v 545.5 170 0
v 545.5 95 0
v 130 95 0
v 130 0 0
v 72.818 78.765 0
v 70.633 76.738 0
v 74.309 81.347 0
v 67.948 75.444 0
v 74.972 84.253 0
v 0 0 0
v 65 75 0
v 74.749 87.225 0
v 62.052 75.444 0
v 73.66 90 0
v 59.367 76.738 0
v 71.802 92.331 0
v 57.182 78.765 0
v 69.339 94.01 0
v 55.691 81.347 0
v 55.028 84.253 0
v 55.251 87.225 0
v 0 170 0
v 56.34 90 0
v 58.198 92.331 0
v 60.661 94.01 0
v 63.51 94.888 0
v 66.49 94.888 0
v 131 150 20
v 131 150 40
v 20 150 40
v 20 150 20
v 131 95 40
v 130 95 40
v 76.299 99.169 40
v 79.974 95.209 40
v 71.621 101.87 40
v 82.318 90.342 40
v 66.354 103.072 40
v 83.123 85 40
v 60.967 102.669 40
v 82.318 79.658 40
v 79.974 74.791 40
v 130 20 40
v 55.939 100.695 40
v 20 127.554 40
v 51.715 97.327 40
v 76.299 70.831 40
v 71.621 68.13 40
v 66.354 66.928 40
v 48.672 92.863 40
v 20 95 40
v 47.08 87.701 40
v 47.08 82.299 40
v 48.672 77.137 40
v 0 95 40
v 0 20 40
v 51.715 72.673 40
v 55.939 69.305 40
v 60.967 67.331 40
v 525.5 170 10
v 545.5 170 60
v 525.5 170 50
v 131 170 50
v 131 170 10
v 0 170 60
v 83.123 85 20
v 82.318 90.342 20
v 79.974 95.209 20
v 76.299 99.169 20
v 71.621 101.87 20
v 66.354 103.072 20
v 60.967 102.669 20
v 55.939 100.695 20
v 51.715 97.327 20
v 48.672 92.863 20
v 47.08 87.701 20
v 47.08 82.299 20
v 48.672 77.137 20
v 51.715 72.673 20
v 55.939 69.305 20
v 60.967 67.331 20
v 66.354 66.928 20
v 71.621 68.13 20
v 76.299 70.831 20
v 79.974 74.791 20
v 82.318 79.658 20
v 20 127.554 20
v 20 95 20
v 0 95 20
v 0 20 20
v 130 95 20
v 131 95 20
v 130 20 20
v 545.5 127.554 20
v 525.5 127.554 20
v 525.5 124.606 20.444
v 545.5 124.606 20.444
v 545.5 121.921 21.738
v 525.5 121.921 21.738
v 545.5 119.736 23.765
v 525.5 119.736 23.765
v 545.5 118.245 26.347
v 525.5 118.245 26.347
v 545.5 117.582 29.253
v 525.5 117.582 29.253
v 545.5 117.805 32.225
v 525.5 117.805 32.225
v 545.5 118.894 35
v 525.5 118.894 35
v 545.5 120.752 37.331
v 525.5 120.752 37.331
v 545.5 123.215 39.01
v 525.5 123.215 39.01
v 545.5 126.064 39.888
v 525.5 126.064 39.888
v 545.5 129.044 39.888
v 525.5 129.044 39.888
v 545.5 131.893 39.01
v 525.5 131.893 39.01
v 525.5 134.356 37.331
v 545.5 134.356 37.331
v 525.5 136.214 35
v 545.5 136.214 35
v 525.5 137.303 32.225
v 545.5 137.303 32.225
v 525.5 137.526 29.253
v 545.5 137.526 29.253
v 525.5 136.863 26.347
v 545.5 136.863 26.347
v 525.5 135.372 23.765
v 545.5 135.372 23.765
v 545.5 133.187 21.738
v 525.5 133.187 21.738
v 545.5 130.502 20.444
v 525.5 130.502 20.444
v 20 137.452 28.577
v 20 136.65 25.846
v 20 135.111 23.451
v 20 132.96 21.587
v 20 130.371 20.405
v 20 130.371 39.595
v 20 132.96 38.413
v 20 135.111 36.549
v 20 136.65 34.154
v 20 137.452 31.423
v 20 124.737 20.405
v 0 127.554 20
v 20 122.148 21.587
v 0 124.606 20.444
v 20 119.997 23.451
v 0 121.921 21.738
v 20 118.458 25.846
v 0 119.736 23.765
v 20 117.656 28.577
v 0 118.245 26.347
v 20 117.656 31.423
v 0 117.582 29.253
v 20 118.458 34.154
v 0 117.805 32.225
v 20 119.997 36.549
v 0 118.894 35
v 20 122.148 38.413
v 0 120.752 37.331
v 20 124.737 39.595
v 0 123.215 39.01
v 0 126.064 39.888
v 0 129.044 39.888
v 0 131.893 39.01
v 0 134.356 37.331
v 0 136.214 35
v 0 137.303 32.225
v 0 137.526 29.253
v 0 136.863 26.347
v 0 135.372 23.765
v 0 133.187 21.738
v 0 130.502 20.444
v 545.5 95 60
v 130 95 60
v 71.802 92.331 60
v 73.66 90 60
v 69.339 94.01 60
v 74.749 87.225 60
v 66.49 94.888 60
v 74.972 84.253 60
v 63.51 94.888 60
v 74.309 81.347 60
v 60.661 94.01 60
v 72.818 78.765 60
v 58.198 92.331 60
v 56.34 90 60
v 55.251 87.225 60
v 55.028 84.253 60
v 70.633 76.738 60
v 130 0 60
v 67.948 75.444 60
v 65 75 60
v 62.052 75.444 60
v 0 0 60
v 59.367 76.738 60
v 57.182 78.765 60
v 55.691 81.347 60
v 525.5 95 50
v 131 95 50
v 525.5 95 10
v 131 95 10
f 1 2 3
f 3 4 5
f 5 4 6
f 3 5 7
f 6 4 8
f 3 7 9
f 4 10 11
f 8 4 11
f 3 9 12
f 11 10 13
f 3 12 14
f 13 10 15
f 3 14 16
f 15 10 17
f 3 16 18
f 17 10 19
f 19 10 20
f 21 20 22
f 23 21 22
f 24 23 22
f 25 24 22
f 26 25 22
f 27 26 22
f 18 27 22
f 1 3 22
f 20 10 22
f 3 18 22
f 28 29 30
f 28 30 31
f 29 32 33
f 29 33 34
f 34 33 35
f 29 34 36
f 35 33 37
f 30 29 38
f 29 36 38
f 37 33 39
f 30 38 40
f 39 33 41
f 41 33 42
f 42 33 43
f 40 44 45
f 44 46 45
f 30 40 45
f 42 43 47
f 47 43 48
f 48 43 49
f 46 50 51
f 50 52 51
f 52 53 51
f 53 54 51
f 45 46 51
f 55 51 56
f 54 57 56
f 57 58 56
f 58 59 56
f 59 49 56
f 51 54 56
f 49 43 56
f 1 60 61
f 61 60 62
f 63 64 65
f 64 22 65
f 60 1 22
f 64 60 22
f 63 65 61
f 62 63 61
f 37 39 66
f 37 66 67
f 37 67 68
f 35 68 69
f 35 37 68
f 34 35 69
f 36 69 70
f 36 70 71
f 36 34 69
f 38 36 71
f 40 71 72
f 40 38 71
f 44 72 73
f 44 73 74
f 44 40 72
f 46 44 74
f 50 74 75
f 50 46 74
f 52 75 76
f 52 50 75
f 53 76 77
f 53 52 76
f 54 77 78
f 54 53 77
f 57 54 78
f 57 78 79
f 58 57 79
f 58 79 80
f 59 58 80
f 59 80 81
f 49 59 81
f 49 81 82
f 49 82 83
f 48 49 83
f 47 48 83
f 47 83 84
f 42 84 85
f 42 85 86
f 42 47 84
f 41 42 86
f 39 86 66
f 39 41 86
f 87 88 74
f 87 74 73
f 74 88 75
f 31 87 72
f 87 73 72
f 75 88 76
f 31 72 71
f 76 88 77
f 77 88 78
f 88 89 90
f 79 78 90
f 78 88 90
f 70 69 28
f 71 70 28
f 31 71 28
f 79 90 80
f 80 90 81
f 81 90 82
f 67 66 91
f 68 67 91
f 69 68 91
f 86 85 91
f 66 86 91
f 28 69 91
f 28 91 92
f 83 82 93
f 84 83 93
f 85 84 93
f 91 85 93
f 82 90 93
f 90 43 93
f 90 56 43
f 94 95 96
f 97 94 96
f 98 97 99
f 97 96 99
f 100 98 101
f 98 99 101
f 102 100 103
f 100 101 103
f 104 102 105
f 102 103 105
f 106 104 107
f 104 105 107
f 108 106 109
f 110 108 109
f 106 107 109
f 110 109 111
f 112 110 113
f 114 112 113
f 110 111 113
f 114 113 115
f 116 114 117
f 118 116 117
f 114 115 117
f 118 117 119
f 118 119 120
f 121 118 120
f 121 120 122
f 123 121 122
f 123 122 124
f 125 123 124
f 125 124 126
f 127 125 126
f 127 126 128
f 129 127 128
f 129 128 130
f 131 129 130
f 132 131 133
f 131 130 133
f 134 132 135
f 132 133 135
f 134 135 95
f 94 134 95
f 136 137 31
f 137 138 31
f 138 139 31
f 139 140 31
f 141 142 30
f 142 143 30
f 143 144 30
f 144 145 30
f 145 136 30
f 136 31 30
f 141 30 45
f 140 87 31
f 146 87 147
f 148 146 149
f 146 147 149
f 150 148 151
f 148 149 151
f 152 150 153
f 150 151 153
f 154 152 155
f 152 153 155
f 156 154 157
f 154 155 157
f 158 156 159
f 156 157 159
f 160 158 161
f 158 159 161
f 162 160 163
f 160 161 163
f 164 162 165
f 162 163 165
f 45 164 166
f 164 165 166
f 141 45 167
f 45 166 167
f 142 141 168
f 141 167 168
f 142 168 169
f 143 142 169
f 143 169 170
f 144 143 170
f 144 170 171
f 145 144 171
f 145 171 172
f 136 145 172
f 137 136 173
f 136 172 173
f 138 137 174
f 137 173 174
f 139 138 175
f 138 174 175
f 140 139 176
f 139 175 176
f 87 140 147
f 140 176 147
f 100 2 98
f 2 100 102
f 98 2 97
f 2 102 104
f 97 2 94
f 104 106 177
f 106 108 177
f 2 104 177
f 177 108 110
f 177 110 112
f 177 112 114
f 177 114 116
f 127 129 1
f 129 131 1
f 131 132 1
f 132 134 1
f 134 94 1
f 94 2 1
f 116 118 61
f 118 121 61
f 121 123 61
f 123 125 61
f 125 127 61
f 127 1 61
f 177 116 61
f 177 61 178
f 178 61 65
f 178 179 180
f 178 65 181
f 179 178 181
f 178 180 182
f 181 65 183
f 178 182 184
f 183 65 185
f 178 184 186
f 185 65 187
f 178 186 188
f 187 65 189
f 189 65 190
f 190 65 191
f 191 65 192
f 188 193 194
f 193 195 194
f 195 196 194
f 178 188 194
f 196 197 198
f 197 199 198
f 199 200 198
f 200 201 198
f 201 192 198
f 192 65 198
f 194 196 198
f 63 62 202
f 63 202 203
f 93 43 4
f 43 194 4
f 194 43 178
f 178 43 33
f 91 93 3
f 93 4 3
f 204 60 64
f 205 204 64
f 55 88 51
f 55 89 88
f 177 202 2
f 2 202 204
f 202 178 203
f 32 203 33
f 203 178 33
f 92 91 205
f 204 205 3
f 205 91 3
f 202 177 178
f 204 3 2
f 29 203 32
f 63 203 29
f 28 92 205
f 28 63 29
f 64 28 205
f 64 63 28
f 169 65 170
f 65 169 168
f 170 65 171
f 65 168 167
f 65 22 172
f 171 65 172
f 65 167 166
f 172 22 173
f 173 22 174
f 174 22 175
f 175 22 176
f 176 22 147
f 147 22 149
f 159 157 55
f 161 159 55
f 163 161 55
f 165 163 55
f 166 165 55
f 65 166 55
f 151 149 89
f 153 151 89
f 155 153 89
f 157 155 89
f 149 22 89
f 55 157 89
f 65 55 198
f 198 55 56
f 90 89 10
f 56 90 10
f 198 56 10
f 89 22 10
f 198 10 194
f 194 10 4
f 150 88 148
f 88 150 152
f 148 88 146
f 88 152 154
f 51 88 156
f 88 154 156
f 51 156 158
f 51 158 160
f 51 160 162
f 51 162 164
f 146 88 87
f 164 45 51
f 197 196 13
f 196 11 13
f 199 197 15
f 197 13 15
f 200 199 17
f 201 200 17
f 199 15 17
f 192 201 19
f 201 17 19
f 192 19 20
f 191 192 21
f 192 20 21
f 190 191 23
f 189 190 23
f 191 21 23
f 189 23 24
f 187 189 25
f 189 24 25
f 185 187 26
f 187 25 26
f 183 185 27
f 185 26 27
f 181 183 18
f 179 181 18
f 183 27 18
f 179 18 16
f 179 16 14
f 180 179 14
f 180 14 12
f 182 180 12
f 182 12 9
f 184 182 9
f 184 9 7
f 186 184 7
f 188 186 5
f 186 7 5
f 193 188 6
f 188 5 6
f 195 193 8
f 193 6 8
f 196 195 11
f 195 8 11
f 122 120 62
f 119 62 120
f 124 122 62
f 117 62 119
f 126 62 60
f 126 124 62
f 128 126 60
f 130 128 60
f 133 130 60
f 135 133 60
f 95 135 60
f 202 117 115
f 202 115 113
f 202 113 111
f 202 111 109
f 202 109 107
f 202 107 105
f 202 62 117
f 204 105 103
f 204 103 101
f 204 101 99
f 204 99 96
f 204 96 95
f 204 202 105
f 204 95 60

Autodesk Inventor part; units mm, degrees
ref_plane "YZ Plane" through (0, 0, 0) normal (1, 0, 0) x (0, 1, 0)
ref_plane "XZ Plane" through (0, 0, 0) normal (0, 1, 0) x (-1, 0, 0)
sketch "Boceto1" plane through (0, 0, 0) normal (0, 0, 1) x (1, 0, 0)
  line L0 (0, 0) -> (130, 0)
  line L1 (130, 0) -> (130, 95)
  line L2 (130, 95) -> (545, 95)
  line L3 (545, 95) -> (545, 170)
  line L4 (545, 170) -> (0, 170)
  line L5 (0, 170) -> (0, 0)
  circle A0 centre (65, 85) radius 10
  dimension "d1" = 95
  dimension "d3" = 75
  dimension "d19" = 20
extrude "Extrusión1" add sketch "Boceto1" along normal blind 60 contours L5 L4 L3 L2 L1 L0 | A0
ref_plane "Plano de trabajo1" through (65, 0, 0) normal (1, 0, 0) x (0, 0, -1)
sketch "Boceto2" plane through (65, 0, 0) normal (1, 0, 0) x (0, 0, -1)
  line L0 (-20, 75) -> (-40, 75)
  line L1 (-40, 75) -> (-40, 20)
  line L2 (0, 0) -> (-60, 0) projected
  line L3 (-40, 20) -> (-20, 20)
  line L4 (-20, 75) -> (-20, 20)
  dimension "d8" = 20
  dimension "d9" = 55
  dimension "d10" = 20
extrude "Extrusión2" cut sketch "Boceto2" along normal blind 400 and the other way blind 200
sketch "Boceto3" plane through (130, 0, 0) normal (1, 0, 0) x (0, 0, -1)
  line L0 (-20, 75) -> (-40, 75) projected
  line L1 (-40, 75) -> (-40, 150)
  line L2 (0, 170) -> (-60, 170) projected
  line L3 (-40, 150) -> (-20, 150)
  line L4 (-20, 150) -> (-20, 75)
  point P0 (0, 0)
  dimension "d15" = 75
  dimension "d16" = 20
extrude "Extrusión3" cut sketch "Boceto3" along normal mid plane 7000
sketch "Boceto4" plane through (65, 0, 0) normal (1, 0, 0) x (0, 0, -1)
  point P0 (0, 0)
sketch "Boceto5" plane through (0, 0, 60) normal (0, 0, 1) x (1, 0, 0)
  line L0 (130, 95) -> (545, 95) projected
  line L1 (545, 170) -> (0, 170) projected
  line L2 (0, 0) -> (130, 0) projected
  point P0 (65, 85)
hole "Agujero1" at (65, 85, 60) direction (0, 0, -1) diameter 0.2159 end through all thread size "30-318 UNM" class "2B" standard "ANSI Unified Screw Threads"
sketch "Boceto6" plane through (0, 0, 0) normal (-1, 0, 0) x (0, 0, 1)
  line L0 (0, 170) -> (0, 0) projected
  line L1 (40, 95) -> (60, 95) projected
  line L2 (0, 95) -> (60, 95)
  line L3 (0, 95) -> (0, 170)
  line L4 (0, 170) -> (60, 170) projected
  line L5 (60, 170) -> (60, 95)
extrude "Extrusión4" add sketch "Boceto6" against normal blind 20
ref_plane "Plano de trabajo8" through (272.5, 0, 0) normal (-1, 0, 0) x (0, 0, 1)
sketch "Boceto7" plane through (272.5, 0, 0) normal (-1, 0, 0) x (0, 0, 1)
  line L0 (40, 95) -> (60, 95) projected
  line L1 (0, 75) -> (0, 95) projected
  line L2 (60, 95) -> (0, 95)
  line L3 (0, 95) -> (0, 170)
  line L4 (0, 170) -> (60, 170)
  line L5 (60, 0) -> (60, 95) projected
  line L6 (60, 170) -> (60, 95)
  point P0 (0, 0)
extrude "Extrusión5" add sketch "Boceto7" against normal blind 273
sketch "Boceto8" plane through (130, 95, 0) normal (0, -1, 0) x (1, 0, 0)
  line L0 (-130, 60) -> (415.5, 60) projected
  line L1 (415.5, 0) -> (415.5, 60) projected
  line L2 (395.5, 40) -> (395.5, 20)
  line L3 (0, 0) -> (415.5, 0) projected
  line L4 (395.5, 40) -> (142.5, 40)
  line L5 (142.5, 20) -> (0, 20) projected
  line L6 (142.5, 40) -> (142.5, 20)
  line L7 (142.5, 20) -> (395.5, 20)
  point P0 (-130, 0)
  point P1 (415, 60)
  point P2 (415, 0)
  point P3 (415, 20)
  dimension "d35" = 20
extrude "Extrusión6" cut sketch "Boceto8" against normal blind 75
sketch "Boceto9" plane through (130, 95, 0) normal (0, -1, 0) x (1, 0, 0)
  line L0 (142.5, 20) -> (142.5, 40) projected
  line L1 (142.5, 20) -> (142.5, 40)
  line L2 (142.5, 40) -> (1, 40)
  line L3 (1, 40) -> (1, 20)
  line L4 (142.5, 20) -> (-110, 20) projected
  line L5 (1, 20) -> (142.5, 20)
  point P0 (-130, 0)
extrude "Extrusión7" cut sketch "Boceto9" against normal blind 75
sketch "Boceto10" plane through (0, 0, 60) normal (0, 0, 1) x (1, 0, 0)
  point P0 (0, 0)
ref_plane "Plano de trabajo9" through (535.5, 0, 0) normal (1, 0, 0) x (0, 0, -1)
sketch "Boceto11" plane through (545.5, 0, 0) normal (1, 0, 0) x (0, 0, -1)
  line L0 (0, 95) -> (-20, 95) projected
  line L1 (0, 170) -> (-60, 170) projected
  line L2 (0, 95) -> (-60, 170)
  line L3 (-60, 84.892) -> (-60, 85.108) projected
  line L4 (0, 170) -> (-60, 85.108)
  circle A0 centre (-30, 127.554) radius 10
  point P0 (0, 0)
  dimension "d40" = 20
hole "Agujero2" at (545.5, 127.554, 30) direction (-1, 0, 0) diameter 20 end through all
sketch "Boceto12" plane through (0, 0, 60) normal (0, 0, 1) x (1, 0, 0)
  line L0 (0, 170) -> (0, 0) projected
  line L1 (130, 0) -> (130, 95) projected
  line L2 (0, 170) -> (130, 0)
  line L3 (130, 95) -> (130, 170)
  line L4 (130, 170) -> (0, 0)
  circle A0 centre (65, 85) radius 10
  dimension "d48" = 20
hole "Agujero3" at (65, 85, 60) direction (0, 0, -1) diameter 20 end through all
extrude "Extrusión8" [suppressed]
hole "Agujero4" at (65, 85, 60) direction (0, 0, -1) diameter 17.8943 end through all thread size "13/16-10 UNC" class "2B" standard "ANSI Unified Screw Threads"
sketch "Boceto13" plane through (0, 170, 60) normal (0, 1, 0) x (1, 0, 0)
  line L0 (131, 40) -> (131, 50)
  line L1 (525.5, 20) -> (525.5, 40) projected
  line L2 (525.5, 40) -> (525.5, 50)
  line L3 (525.5, 50) -> (131, 50)
  line L4 (131, 40) -> (525.5, 40) projected
  line L5 (131, 40) -> (525.5, 40)
  line L6 (525.5, 20) -> (131, 20) projected
  line L7 (131, 20) -> (131, 10)
  line L8 (525.5, 20) -> (525.5, 10)
  line L9 (525.5, 10) -> (131, 10)
  point P0 (0, 60)
  dimension "d65" = 10
  dimension "d66" = 10
  dimension "d67" = 10
  dimension "d68" = 10
extrude "Extrusión9" cut sketch "Boceto13" against normal through all
sketch "Boceto14" plane through (130, 20, 40) normal (0, 0, -1) x (-1, 0, 0)
  circle A0 centre (65, 65) radius 10 projected
  circle A1 centre (65, 65) radius 10
  point P0 (130, -20)
extrude "Extrusión10" add sketch "Boceto14" along normal blind 40
sketch "Boceto15" plane through (0, 0, 60) normal (0, 0, 1) x (1, 0, 0)
  circle A0 centre (65, 85) radius 10
  circle A1 centre (65, 85) radius 18.123
  point P0 (0, 0)
  dimension "d80" = 36.246
hole "Agujero5" at (65, 85, 60) direction (0, 0, -1) diameter 36.2458 end through all thread size "1 9/16-8 UN" class "2B" standard "ANSI Unified Screw Threads"
extrude "Extrusión11" add sketch "Boceto15" along normal mid plane 150 contours A0 | A1
sketch "Boceto16" plane through (0, 0, 0) normal (0, -1, 0) x (1, 0, 0)
  line L0 (0, 60) -> (0, 142)
  line L1 (130, 40) -> (130, 60) projected
  line L2 (130, 60) -> (130, 150)
  line L3 (130, 150) -> (0, 142)
  line L4 (0, 60) -> (130, 60)
  line L5 (131, 50) -> (525.5, 50) projected
  point P0 (0, 0)
extrude "Extrusión12" cut sketch "Boceto16" against normal blind 150
sketch "Boceto17" plane through (0, 170, 60) normal (0, 1, 0) x (1, 0, 0)
  line L0 (0, 60) -> (130, 60) projected
  line L1 (0, 60) -> (0, 117)
  line L2 (130, 60) -> (130, 106)
  line L3 (0, 60) -> (130, 60)
  line L4 (0, 117) -> (130, 106)
extrude "Extrusión13" cut sketch "Boceto17" against normal blind 150
sketch "Boceto18" plane through (0, 0, 60) normal (0, 0, 1) x (1, 0, 0)
  circle A0 centre (65, 85) radius 10
  point P0 (0, 0)
  dimension "d87" = 20
hole "Agujero6" at (65, 85, 60) direction (0, 0, -1) diameter 0.2159 end through all thread size "30-318 UNM" class "2B" standard "ANSI Unified Screw Threads"
hole "Agujero7" at (65, 85, 60) direction (0, 0, -1) diameter 20 end through all
thread "Rosca1" size "M20x2.5" class "6H" standard "ANSI Metric M Profile" full length
properties part number "PiezaMovil"
